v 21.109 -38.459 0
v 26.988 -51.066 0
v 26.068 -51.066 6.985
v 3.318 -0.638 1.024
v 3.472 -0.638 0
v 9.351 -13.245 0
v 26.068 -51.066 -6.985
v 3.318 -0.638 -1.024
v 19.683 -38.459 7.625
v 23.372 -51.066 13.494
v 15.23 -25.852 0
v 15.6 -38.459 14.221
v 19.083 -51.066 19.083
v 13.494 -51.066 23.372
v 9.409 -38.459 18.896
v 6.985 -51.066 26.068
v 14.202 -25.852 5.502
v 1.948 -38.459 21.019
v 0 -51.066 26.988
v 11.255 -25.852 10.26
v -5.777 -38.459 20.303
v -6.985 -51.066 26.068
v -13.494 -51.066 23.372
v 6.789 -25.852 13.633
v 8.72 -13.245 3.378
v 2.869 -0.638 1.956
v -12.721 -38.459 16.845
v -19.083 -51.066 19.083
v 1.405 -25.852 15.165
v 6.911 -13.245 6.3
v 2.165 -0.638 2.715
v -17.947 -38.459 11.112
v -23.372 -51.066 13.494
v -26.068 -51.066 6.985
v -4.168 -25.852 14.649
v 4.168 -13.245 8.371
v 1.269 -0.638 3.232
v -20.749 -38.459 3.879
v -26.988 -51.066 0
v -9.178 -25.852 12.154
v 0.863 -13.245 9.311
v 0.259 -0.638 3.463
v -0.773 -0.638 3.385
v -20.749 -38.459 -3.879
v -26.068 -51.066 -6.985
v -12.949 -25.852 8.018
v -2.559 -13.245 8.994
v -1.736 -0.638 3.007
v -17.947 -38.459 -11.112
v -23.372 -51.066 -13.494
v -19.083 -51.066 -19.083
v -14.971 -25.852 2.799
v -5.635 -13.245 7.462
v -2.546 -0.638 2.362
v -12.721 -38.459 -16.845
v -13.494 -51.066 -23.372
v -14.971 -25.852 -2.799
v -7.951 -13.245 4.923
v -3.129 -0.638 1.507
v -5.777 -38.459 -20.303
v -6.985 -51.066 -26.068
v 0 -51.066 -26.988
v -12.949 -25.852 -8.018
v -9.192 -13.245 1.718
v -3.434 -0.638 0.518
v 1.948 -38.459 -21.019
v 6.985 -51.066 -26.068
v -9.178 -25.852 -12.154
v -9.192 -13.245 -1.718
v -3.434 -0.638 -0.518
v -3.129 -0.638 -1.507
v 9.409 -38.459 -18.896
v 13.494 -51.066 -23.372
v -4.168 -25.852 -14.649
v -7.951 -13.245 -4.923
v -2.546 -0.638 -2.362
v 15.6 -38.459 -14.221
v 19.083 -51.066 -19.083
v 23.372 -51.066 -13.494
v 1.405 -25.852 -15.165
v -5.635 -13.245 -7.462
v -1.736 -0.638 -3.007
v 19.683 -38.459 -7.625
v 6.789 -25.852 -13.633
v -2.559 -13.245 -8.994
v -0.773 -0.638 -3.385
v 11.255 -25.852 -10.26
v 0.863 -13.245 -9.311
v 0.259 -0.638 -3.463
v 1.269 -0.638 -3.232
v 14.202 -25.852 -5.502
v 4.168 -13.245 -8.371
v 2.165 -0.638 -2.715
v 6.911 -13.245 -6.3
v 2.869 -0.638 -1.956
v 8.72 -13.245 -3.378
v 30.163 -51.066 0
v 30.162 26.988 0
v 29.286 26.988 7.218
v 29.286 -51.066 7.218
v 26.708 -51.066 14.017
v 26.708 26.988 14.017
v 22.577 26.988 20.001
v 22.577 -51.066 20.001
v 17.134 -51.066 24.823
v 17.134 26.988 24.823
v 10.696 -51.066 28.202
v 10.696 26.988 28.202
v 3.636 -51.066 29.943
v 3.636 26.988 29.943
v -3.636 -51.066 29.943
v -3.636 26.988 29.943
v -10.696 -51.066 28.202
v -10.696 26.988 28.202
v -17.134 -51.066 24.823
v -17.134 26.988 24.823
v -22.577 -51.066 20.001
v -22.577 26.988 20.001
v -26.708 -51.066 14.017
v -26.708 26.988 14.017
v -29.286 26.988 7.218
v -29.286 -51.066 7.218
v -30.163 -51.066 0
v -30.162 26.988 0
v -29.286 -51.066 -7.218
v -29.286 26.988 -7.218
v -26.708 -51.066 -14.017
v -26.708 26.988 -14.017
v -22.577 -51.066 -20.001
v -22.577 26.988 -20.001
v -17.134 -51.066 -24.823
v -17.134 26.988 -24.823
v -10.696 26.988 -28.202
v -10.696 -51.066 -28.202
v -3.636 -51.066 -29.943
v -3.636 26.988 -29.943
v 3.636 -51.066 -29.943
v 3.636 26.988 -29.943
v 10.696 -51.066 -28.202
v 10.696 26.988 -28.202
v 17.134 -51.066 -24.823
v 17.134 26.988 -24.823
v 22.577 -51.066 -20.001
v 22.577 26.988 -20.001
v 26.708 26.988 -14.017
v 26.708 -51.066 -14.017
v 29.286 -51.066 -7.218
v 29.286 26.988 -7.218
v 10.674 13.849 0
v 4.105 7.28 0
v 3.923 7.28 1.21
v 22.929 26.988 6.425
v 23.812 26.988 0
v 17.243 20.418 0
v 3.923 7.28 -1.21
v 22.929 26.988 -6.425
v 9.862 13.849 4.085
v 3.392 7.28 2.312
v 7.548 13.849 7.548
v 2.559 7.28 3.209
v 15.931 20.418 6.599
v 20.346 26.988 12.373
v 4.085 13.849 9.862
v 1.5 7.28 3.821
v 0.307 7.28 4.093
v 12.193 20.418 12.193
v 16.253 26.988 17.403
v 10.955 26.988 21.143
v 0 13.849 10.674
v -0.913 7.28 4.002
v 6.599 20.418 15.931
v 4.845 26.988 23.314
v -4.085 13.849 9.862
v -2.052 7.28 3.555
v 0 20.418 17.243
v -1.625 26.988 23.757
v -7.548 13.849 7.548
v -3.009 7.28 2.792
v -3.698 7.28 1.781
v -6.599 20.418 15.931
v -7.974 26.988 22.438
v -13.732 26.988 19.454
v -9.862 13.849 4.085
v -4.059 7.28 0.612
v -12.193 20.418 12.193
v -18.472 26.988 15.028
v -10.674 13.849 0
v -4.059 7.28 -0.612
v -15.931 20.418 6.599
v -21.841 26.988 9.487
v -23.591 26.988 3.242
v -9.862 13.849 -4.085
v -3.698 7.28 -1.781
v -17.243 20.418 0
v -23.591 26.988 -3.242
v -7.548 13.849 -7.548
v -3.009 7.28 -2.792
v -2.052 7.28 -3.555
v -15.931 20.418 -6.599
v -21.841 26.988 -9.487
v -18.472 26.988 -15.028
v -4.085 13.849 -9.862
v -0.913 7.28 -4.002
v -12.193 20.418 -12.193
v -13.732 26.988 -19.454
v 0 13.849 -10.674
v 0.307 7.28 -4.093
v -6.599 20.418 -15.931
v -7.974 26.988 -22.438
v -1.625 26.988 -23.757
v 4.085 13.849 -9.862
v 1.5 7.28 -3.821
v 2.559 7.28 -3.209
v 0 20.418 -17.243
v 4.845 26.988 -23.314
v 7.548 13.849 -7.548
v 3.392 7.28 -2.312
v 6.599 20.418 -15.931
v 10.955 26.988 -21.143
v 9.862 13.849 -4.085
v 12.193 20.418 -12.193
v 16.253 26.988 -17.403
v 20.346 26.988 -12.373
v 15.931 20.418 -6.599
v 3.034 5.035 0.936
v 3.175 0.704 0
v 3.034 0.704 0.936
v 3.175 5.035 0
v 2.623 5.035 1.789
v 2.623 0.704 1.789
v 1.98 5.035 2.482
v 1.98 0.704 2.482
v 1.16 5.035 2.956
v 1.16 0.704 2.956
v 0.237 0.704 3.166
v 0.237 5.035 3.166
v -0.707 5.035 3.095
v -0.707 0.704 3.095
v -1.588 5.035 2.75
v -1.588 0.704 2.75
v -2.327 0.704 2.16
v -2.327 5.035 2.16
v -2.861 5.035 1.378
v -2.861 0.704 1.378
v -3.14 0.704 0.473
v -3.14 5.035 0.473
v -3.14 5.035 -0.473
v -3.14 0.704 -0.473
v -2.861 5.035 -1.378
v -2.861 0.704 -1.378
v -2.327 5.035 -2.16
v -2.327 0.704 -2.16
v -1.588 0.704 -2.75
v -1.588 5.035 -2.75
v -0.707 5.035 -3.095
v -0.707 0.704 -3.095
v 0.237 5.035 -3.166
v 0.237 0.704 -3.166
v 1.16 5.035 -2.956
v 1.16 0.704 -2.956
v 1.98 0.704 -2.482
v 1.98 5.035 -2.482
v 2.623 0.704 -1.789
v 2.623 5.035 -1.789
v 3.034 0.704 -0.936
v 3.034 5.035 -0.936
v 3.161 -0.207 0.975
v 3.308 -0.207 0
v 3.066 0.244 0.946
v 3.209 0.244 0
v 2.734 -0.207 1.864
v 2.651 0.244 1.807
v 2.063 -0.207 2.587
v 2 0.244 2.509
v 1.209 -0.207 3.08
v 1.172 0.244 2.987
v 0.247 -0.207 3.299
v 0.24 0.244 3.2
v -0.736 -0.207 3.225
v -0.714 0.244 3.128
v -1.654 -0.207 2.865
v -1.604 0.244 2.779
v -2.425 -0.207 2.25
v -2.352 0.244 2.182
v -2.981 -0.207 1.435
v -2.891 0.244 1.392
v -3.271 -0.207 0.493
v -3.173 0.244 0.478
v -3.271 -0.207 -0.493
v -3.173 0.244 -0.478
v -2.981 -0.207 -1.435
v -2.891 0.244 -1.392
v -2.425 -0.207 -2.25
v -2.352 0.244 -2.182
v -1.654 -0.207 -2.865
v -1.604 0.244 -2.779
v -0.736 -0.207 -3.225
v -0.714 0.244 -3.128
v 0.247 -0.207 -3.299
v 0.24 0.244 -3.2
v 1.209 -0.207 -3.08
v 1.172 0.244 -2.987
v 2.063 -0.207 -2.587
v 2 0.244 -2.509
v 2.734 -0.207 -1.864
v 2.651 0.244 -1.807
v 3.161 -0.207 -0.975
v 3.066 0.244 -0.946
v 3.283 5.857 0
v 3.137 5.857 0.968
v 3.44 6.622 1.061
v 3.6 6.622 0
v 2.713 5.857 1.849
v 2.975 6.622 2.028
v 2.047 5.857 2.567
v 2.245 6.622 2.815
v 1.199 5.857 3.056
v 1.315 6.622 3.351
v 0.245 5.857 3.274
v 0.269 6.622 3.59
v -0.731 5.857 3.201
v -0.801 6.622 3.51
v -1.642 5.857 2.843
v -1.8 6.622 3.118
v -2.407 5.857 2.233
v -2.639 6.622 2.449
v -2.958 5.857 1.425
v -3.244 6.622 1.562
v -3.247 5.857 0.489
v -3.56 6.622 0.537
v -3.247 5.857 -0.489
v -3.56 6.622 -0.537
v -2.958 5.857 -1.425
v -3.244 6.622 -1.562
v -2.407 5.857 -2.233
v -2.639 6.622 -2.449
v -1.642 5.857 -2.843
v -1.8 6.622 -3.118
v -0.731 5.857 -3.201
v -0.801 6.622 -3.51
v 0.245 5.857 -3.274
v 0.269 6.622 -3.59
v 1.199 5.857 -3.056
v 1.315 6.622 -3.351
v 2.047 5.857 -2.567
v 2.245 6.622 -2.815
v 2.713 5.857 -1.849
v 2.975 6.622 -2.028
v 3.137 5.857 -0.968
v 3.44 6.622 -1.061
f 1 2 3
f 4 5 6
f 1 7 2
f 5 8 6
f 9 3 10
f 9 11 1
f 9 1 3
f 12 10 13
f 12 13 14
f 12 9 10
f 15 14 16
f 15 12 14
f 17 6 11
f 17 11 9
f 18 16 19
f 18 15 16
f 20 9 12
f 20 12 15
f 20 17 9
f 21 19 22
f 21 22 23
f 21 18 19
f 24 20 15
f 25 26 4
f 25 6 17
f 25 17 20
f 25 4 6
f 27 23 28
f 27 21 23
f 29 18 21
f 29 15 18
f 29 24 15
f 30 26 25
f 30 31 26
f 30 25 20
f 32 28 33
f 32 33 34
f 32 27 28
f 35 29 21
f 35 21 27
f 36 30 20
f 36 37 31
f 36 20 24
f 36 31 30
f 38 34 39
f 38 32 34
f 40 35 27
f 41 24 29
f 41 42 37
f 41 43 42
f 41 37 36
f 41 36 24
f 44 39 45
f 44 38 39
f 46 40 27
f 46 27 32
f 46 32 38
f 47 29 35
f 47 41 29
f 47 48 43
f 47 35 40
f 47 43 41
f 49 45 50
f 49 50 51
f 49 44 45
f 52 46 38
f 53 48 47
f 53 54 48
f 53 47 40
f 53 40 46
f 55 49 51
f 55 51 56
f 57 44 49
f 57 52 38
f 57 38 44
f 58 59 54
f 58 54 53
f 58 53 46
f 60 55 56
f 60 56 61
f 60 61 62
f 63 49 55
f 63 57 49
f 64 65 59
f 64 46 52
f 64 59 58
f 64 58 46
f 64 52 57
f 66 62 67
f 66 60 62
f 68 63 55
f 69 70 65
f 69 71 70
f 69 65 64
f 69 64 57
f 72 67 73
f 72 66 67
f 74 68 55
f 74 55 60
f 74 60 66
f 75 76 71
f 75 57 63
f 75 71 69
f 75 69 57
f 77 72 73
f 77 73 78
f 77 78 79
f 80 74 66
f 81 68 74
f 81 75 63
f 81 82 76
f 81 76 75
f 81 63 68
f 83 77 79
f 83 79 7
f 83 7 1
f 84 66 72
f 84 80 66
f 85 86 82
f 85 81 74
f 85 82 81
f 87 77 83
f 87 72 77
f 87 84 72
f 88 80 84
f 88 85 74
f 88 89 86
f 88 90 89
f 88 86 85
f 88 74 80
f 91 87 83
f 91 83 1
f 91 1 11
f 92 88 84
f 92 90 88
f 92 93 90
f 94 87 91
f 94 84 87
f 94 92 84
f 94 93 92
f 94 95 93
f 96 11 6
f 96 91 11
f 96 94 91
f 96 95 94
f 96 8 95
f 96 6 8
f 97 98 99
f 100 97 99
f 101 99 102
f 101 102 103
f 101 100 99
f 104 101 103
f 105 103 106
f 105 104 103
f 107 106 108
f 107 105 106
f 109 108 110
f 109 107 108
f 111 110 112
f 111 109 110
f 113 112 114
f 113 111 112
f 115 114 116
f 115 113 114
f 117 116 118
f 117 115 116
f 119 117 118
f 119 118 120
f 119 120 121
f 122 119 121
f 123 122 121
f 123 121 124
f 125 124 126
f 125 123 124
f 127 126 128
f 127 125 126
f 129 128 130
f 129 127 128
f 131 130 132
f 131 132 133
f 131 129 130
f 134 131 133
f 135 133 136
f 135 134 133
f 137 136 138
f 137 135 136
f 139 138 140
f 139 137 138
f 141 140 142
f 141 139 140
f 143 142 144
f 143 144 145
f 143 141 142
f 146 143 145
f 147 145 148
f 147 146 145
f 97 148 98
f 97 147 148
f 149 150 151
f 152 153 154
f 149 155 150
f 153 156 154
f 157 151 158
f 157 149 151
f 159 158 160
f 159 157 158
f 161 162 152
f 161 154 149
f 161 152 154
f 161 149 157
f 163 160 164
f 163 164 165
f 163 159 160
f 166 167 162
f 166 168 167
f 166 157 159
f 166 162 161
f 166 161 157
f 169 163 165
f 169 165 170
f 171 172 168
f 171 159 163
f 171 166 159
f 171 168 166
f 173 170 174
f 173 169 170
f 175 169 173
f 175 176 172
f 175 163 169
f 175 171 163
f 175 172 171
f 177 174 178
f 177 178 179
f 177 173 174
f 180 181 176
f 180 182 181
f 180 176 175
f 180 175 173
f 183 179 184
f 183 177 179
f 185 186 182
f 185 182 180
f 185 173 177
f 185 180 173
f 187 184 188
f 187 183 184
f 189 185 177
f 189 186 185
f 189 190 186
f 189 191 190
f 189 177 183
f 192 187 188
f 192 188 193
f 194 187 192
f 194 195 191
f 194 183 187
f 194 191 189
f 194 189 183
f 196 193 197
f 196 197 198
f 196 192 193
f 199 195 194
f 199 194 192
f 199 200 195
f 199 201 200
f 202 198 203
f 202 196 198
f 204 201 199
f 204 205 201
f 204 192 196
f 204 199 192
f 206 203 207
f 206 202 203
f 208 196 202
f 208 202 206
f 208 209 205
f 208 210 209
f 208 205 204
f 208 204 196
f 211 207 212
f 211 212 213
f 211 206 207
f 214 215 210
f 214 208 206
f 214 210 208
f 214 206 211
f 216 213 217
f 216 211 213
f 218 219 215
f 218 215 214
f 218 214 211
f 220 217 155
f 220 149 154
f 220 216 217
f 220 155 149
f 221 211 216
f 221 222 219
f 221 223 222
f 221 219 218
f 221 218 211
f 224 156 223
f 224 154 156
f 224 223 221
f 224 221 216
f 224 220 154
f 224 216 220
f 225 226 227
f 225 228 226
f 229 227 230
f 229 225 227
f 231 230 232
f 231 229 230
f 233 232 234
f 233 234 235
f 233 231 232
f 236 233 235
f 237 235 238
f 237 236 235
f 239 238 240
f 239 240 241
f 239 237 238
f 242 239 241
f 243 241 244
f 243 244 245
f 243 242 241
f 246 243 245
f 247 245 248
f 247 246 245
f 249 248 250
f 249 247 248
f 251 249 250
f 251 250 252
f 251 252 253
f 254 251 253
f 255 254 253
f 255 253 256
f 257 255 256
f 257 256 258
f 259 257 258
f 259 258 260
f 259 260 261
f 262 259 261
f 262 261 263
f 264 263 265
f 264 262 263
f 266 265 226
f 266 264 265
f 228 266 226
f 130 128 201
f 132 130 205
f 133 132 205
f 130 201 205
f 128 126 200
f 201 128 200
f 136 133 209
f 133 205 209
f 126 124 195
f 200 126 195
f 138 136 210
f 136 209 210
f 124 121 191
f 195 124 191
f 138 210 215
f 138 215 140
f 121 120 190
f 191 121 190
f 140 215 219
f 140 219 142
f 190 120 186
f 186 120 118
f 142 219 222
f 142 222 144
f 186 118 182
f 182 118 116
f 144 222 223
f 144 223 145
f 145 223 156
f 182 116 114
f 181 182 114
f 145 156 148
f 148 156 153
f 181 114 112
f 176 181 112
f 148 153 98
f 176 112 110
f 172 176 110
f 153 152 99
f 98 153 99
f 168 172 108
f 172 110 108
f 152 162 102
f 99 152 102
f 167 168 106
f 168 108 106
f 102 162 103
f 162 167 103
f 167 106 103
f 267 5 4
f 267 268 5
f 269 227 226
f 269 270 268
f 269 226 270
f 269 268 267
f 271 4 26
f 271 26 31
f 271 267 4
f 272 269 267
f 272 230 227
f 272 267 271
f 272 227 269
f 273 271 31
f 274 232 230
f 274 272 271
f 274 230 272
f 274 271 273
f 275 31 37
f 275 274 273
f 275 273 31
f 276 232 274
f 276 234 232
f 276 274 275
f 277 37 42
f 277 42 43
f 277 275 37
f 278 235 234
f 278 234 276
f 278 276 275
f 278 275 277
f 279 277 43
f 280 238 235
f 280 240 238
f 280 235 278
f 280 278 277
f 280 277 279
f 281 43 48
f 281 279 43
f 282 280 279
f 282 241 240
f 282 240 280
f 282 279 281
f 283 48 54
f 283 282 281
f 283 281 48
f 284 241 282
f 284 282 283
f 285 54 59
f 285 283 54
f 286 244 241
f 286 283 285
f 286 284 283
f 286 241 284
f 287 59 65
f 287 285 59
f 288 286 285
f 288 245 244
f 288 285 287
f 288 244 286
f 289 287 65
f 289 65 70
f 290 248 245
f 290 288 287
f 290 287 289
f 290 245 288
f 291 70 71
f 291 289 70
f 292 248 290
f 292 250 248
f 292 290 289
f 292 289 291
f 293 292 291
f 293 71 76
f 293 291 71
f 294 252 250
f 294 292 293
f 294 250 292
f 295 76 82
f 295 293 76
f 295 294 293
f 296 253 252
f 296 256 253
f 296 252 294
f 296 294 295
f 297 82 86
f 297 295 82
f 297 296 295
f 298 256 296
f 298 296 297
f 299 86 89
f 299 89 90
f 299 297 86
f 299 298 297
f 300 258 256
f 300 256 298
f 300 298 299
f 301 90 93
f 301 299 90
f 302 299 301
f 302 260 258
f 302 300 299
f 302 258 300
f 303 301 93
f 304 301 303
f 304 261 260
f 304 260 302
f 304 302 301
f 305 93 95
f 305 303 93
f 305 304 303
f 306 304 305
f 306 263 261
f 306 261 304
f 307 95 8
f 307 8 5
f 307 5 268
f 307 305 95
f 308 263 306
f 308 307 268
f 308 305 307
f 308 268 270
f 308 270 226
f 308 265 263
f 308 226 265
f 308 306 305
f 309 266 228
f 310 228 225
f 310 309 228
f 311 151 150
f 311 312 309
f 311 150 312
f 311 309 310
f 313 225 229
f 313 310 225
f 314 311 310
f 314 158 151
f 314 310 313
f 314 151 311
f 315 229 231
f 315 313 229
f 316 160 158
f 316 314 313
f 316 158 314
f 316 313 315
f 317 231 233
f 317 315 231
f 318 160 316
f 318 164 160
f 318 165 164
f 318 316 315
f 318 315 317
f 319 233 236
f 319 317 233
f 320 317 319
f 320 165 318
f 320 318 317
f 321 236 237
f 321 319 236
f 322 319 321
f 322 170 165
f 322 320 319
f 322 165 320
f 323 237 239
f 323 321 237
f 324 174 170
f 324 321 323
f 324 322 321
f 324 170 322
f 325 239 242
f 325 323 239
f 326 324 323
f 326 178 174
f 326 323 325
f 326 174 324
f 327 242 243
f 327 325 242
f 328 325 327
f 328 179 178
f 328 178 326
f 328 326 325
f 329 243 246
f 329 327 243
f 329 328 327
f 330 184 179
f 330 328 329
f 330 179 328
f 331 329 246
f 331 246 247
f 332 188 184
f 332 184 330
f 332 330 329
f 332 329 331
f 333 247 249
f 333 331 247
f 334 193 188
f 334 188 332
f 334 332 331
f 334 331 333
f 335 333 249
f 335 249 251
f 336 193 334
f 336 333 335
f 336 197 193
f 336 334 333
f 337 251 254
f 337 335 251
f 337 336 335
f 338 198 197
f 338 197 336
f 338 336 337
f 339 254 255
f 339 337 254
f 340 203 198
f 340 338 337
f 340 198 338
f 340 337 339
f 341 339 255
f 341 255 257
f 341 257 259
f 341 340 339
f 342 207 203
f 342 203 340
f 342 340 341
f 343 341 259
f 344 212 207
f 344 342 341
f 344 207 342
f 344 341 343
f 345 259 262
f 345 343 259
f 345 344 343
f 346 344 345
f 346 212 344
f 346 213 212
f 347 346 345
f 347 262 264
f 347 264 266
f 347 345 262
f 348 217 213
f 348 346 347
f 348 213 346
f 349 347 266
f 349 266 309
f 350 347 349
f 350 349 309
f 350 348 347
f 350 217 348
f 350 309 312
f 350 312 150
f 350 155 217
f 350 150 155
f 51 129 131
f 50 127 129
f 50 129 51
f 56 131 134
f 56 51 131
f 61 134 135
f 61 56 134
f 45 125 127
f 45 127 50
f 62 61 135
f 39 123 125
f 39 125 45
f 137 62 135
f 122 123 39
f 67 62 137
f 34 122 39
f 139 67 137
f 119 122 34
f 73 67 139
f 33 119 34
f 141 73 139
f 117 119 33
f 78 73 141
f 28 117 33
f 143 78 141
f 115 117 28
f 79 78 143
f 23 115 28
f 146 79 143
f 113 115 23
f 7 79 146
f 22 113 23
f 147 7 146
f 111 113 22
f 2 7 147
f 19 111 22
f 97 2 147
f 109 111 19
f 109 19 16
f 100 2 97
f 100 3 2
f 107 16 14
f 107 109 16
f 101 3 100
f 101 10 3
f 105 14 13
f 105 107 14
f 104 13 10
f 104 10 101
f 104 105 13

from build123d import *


with BuildPart() as part:
    # Sketch5 → Revolve2 (revolve)
    with BuildSketch(Plane.XY):
        with BuildLine():
            ThreePointArc((6.647472776, -0.637932427), (6.425260177, 0.01668478), (6.35, 0.703880554))
            Line((6.35, 0.703880554), (6.35, 5.034871939))
            ThreePointArc((6.35, 5.034871939), (6.591682484, 6.249891837), (7.27993597, 7.27993597))
            Line((7.27993597, 7.27993597), (26.9875, 26.9875))
            Line((26.9875, 26.9875), (30.1625, 26.9875))
            Line((30.1625, 26.9875), (30.1625, -51.066071045))
            Line((30.1625, -51.066071045), (6.647472776, -0.637932427))
        make_face()
        with BuildLine():
            ThreePointArc((3.175, 5.034871939), (3.416682484, 6.249891837), (4.10493597, 7.27993597))
            Line((4.10493597, 7.27993597), (23.8125, 26.9875))
            Line((23.8125, 26.9875), (26.9875, 26.9875))
            Line((26.9875, 26.9875), (7.27993597, 7.27993597))
            ThreePointArc((7.27993597, 7.27993597), (6.591682484, 6.249891837), (6.35, 5.034871939))
            Line((6.35, 5.034871939), (6.35, 0.703880554))
            ThreePointArc((6.35, 0.703880554), (6.425260177, 0.01668478), (6.647472776, -0.637932427))
            Line((6.647472776, -0.637932427), (30.1625, -51.066071045))
            Line((30.1625, -51.066071045), (26.9875, -51.066071045))
            Line((26.9875, -51.066071045), (3.472472776, -0.637932427))
            ThreePointArc((3.472472776, -0.637932427), (3.250260177, 0.01668478), (3.175, 0.703880554))
            Line((3.175, 0.703880554), (3.175, 5.034871939))
        make_face()
    revolve(axis=Axis((0, 0, 0), (0, -1, 0)))


solid = part.part
